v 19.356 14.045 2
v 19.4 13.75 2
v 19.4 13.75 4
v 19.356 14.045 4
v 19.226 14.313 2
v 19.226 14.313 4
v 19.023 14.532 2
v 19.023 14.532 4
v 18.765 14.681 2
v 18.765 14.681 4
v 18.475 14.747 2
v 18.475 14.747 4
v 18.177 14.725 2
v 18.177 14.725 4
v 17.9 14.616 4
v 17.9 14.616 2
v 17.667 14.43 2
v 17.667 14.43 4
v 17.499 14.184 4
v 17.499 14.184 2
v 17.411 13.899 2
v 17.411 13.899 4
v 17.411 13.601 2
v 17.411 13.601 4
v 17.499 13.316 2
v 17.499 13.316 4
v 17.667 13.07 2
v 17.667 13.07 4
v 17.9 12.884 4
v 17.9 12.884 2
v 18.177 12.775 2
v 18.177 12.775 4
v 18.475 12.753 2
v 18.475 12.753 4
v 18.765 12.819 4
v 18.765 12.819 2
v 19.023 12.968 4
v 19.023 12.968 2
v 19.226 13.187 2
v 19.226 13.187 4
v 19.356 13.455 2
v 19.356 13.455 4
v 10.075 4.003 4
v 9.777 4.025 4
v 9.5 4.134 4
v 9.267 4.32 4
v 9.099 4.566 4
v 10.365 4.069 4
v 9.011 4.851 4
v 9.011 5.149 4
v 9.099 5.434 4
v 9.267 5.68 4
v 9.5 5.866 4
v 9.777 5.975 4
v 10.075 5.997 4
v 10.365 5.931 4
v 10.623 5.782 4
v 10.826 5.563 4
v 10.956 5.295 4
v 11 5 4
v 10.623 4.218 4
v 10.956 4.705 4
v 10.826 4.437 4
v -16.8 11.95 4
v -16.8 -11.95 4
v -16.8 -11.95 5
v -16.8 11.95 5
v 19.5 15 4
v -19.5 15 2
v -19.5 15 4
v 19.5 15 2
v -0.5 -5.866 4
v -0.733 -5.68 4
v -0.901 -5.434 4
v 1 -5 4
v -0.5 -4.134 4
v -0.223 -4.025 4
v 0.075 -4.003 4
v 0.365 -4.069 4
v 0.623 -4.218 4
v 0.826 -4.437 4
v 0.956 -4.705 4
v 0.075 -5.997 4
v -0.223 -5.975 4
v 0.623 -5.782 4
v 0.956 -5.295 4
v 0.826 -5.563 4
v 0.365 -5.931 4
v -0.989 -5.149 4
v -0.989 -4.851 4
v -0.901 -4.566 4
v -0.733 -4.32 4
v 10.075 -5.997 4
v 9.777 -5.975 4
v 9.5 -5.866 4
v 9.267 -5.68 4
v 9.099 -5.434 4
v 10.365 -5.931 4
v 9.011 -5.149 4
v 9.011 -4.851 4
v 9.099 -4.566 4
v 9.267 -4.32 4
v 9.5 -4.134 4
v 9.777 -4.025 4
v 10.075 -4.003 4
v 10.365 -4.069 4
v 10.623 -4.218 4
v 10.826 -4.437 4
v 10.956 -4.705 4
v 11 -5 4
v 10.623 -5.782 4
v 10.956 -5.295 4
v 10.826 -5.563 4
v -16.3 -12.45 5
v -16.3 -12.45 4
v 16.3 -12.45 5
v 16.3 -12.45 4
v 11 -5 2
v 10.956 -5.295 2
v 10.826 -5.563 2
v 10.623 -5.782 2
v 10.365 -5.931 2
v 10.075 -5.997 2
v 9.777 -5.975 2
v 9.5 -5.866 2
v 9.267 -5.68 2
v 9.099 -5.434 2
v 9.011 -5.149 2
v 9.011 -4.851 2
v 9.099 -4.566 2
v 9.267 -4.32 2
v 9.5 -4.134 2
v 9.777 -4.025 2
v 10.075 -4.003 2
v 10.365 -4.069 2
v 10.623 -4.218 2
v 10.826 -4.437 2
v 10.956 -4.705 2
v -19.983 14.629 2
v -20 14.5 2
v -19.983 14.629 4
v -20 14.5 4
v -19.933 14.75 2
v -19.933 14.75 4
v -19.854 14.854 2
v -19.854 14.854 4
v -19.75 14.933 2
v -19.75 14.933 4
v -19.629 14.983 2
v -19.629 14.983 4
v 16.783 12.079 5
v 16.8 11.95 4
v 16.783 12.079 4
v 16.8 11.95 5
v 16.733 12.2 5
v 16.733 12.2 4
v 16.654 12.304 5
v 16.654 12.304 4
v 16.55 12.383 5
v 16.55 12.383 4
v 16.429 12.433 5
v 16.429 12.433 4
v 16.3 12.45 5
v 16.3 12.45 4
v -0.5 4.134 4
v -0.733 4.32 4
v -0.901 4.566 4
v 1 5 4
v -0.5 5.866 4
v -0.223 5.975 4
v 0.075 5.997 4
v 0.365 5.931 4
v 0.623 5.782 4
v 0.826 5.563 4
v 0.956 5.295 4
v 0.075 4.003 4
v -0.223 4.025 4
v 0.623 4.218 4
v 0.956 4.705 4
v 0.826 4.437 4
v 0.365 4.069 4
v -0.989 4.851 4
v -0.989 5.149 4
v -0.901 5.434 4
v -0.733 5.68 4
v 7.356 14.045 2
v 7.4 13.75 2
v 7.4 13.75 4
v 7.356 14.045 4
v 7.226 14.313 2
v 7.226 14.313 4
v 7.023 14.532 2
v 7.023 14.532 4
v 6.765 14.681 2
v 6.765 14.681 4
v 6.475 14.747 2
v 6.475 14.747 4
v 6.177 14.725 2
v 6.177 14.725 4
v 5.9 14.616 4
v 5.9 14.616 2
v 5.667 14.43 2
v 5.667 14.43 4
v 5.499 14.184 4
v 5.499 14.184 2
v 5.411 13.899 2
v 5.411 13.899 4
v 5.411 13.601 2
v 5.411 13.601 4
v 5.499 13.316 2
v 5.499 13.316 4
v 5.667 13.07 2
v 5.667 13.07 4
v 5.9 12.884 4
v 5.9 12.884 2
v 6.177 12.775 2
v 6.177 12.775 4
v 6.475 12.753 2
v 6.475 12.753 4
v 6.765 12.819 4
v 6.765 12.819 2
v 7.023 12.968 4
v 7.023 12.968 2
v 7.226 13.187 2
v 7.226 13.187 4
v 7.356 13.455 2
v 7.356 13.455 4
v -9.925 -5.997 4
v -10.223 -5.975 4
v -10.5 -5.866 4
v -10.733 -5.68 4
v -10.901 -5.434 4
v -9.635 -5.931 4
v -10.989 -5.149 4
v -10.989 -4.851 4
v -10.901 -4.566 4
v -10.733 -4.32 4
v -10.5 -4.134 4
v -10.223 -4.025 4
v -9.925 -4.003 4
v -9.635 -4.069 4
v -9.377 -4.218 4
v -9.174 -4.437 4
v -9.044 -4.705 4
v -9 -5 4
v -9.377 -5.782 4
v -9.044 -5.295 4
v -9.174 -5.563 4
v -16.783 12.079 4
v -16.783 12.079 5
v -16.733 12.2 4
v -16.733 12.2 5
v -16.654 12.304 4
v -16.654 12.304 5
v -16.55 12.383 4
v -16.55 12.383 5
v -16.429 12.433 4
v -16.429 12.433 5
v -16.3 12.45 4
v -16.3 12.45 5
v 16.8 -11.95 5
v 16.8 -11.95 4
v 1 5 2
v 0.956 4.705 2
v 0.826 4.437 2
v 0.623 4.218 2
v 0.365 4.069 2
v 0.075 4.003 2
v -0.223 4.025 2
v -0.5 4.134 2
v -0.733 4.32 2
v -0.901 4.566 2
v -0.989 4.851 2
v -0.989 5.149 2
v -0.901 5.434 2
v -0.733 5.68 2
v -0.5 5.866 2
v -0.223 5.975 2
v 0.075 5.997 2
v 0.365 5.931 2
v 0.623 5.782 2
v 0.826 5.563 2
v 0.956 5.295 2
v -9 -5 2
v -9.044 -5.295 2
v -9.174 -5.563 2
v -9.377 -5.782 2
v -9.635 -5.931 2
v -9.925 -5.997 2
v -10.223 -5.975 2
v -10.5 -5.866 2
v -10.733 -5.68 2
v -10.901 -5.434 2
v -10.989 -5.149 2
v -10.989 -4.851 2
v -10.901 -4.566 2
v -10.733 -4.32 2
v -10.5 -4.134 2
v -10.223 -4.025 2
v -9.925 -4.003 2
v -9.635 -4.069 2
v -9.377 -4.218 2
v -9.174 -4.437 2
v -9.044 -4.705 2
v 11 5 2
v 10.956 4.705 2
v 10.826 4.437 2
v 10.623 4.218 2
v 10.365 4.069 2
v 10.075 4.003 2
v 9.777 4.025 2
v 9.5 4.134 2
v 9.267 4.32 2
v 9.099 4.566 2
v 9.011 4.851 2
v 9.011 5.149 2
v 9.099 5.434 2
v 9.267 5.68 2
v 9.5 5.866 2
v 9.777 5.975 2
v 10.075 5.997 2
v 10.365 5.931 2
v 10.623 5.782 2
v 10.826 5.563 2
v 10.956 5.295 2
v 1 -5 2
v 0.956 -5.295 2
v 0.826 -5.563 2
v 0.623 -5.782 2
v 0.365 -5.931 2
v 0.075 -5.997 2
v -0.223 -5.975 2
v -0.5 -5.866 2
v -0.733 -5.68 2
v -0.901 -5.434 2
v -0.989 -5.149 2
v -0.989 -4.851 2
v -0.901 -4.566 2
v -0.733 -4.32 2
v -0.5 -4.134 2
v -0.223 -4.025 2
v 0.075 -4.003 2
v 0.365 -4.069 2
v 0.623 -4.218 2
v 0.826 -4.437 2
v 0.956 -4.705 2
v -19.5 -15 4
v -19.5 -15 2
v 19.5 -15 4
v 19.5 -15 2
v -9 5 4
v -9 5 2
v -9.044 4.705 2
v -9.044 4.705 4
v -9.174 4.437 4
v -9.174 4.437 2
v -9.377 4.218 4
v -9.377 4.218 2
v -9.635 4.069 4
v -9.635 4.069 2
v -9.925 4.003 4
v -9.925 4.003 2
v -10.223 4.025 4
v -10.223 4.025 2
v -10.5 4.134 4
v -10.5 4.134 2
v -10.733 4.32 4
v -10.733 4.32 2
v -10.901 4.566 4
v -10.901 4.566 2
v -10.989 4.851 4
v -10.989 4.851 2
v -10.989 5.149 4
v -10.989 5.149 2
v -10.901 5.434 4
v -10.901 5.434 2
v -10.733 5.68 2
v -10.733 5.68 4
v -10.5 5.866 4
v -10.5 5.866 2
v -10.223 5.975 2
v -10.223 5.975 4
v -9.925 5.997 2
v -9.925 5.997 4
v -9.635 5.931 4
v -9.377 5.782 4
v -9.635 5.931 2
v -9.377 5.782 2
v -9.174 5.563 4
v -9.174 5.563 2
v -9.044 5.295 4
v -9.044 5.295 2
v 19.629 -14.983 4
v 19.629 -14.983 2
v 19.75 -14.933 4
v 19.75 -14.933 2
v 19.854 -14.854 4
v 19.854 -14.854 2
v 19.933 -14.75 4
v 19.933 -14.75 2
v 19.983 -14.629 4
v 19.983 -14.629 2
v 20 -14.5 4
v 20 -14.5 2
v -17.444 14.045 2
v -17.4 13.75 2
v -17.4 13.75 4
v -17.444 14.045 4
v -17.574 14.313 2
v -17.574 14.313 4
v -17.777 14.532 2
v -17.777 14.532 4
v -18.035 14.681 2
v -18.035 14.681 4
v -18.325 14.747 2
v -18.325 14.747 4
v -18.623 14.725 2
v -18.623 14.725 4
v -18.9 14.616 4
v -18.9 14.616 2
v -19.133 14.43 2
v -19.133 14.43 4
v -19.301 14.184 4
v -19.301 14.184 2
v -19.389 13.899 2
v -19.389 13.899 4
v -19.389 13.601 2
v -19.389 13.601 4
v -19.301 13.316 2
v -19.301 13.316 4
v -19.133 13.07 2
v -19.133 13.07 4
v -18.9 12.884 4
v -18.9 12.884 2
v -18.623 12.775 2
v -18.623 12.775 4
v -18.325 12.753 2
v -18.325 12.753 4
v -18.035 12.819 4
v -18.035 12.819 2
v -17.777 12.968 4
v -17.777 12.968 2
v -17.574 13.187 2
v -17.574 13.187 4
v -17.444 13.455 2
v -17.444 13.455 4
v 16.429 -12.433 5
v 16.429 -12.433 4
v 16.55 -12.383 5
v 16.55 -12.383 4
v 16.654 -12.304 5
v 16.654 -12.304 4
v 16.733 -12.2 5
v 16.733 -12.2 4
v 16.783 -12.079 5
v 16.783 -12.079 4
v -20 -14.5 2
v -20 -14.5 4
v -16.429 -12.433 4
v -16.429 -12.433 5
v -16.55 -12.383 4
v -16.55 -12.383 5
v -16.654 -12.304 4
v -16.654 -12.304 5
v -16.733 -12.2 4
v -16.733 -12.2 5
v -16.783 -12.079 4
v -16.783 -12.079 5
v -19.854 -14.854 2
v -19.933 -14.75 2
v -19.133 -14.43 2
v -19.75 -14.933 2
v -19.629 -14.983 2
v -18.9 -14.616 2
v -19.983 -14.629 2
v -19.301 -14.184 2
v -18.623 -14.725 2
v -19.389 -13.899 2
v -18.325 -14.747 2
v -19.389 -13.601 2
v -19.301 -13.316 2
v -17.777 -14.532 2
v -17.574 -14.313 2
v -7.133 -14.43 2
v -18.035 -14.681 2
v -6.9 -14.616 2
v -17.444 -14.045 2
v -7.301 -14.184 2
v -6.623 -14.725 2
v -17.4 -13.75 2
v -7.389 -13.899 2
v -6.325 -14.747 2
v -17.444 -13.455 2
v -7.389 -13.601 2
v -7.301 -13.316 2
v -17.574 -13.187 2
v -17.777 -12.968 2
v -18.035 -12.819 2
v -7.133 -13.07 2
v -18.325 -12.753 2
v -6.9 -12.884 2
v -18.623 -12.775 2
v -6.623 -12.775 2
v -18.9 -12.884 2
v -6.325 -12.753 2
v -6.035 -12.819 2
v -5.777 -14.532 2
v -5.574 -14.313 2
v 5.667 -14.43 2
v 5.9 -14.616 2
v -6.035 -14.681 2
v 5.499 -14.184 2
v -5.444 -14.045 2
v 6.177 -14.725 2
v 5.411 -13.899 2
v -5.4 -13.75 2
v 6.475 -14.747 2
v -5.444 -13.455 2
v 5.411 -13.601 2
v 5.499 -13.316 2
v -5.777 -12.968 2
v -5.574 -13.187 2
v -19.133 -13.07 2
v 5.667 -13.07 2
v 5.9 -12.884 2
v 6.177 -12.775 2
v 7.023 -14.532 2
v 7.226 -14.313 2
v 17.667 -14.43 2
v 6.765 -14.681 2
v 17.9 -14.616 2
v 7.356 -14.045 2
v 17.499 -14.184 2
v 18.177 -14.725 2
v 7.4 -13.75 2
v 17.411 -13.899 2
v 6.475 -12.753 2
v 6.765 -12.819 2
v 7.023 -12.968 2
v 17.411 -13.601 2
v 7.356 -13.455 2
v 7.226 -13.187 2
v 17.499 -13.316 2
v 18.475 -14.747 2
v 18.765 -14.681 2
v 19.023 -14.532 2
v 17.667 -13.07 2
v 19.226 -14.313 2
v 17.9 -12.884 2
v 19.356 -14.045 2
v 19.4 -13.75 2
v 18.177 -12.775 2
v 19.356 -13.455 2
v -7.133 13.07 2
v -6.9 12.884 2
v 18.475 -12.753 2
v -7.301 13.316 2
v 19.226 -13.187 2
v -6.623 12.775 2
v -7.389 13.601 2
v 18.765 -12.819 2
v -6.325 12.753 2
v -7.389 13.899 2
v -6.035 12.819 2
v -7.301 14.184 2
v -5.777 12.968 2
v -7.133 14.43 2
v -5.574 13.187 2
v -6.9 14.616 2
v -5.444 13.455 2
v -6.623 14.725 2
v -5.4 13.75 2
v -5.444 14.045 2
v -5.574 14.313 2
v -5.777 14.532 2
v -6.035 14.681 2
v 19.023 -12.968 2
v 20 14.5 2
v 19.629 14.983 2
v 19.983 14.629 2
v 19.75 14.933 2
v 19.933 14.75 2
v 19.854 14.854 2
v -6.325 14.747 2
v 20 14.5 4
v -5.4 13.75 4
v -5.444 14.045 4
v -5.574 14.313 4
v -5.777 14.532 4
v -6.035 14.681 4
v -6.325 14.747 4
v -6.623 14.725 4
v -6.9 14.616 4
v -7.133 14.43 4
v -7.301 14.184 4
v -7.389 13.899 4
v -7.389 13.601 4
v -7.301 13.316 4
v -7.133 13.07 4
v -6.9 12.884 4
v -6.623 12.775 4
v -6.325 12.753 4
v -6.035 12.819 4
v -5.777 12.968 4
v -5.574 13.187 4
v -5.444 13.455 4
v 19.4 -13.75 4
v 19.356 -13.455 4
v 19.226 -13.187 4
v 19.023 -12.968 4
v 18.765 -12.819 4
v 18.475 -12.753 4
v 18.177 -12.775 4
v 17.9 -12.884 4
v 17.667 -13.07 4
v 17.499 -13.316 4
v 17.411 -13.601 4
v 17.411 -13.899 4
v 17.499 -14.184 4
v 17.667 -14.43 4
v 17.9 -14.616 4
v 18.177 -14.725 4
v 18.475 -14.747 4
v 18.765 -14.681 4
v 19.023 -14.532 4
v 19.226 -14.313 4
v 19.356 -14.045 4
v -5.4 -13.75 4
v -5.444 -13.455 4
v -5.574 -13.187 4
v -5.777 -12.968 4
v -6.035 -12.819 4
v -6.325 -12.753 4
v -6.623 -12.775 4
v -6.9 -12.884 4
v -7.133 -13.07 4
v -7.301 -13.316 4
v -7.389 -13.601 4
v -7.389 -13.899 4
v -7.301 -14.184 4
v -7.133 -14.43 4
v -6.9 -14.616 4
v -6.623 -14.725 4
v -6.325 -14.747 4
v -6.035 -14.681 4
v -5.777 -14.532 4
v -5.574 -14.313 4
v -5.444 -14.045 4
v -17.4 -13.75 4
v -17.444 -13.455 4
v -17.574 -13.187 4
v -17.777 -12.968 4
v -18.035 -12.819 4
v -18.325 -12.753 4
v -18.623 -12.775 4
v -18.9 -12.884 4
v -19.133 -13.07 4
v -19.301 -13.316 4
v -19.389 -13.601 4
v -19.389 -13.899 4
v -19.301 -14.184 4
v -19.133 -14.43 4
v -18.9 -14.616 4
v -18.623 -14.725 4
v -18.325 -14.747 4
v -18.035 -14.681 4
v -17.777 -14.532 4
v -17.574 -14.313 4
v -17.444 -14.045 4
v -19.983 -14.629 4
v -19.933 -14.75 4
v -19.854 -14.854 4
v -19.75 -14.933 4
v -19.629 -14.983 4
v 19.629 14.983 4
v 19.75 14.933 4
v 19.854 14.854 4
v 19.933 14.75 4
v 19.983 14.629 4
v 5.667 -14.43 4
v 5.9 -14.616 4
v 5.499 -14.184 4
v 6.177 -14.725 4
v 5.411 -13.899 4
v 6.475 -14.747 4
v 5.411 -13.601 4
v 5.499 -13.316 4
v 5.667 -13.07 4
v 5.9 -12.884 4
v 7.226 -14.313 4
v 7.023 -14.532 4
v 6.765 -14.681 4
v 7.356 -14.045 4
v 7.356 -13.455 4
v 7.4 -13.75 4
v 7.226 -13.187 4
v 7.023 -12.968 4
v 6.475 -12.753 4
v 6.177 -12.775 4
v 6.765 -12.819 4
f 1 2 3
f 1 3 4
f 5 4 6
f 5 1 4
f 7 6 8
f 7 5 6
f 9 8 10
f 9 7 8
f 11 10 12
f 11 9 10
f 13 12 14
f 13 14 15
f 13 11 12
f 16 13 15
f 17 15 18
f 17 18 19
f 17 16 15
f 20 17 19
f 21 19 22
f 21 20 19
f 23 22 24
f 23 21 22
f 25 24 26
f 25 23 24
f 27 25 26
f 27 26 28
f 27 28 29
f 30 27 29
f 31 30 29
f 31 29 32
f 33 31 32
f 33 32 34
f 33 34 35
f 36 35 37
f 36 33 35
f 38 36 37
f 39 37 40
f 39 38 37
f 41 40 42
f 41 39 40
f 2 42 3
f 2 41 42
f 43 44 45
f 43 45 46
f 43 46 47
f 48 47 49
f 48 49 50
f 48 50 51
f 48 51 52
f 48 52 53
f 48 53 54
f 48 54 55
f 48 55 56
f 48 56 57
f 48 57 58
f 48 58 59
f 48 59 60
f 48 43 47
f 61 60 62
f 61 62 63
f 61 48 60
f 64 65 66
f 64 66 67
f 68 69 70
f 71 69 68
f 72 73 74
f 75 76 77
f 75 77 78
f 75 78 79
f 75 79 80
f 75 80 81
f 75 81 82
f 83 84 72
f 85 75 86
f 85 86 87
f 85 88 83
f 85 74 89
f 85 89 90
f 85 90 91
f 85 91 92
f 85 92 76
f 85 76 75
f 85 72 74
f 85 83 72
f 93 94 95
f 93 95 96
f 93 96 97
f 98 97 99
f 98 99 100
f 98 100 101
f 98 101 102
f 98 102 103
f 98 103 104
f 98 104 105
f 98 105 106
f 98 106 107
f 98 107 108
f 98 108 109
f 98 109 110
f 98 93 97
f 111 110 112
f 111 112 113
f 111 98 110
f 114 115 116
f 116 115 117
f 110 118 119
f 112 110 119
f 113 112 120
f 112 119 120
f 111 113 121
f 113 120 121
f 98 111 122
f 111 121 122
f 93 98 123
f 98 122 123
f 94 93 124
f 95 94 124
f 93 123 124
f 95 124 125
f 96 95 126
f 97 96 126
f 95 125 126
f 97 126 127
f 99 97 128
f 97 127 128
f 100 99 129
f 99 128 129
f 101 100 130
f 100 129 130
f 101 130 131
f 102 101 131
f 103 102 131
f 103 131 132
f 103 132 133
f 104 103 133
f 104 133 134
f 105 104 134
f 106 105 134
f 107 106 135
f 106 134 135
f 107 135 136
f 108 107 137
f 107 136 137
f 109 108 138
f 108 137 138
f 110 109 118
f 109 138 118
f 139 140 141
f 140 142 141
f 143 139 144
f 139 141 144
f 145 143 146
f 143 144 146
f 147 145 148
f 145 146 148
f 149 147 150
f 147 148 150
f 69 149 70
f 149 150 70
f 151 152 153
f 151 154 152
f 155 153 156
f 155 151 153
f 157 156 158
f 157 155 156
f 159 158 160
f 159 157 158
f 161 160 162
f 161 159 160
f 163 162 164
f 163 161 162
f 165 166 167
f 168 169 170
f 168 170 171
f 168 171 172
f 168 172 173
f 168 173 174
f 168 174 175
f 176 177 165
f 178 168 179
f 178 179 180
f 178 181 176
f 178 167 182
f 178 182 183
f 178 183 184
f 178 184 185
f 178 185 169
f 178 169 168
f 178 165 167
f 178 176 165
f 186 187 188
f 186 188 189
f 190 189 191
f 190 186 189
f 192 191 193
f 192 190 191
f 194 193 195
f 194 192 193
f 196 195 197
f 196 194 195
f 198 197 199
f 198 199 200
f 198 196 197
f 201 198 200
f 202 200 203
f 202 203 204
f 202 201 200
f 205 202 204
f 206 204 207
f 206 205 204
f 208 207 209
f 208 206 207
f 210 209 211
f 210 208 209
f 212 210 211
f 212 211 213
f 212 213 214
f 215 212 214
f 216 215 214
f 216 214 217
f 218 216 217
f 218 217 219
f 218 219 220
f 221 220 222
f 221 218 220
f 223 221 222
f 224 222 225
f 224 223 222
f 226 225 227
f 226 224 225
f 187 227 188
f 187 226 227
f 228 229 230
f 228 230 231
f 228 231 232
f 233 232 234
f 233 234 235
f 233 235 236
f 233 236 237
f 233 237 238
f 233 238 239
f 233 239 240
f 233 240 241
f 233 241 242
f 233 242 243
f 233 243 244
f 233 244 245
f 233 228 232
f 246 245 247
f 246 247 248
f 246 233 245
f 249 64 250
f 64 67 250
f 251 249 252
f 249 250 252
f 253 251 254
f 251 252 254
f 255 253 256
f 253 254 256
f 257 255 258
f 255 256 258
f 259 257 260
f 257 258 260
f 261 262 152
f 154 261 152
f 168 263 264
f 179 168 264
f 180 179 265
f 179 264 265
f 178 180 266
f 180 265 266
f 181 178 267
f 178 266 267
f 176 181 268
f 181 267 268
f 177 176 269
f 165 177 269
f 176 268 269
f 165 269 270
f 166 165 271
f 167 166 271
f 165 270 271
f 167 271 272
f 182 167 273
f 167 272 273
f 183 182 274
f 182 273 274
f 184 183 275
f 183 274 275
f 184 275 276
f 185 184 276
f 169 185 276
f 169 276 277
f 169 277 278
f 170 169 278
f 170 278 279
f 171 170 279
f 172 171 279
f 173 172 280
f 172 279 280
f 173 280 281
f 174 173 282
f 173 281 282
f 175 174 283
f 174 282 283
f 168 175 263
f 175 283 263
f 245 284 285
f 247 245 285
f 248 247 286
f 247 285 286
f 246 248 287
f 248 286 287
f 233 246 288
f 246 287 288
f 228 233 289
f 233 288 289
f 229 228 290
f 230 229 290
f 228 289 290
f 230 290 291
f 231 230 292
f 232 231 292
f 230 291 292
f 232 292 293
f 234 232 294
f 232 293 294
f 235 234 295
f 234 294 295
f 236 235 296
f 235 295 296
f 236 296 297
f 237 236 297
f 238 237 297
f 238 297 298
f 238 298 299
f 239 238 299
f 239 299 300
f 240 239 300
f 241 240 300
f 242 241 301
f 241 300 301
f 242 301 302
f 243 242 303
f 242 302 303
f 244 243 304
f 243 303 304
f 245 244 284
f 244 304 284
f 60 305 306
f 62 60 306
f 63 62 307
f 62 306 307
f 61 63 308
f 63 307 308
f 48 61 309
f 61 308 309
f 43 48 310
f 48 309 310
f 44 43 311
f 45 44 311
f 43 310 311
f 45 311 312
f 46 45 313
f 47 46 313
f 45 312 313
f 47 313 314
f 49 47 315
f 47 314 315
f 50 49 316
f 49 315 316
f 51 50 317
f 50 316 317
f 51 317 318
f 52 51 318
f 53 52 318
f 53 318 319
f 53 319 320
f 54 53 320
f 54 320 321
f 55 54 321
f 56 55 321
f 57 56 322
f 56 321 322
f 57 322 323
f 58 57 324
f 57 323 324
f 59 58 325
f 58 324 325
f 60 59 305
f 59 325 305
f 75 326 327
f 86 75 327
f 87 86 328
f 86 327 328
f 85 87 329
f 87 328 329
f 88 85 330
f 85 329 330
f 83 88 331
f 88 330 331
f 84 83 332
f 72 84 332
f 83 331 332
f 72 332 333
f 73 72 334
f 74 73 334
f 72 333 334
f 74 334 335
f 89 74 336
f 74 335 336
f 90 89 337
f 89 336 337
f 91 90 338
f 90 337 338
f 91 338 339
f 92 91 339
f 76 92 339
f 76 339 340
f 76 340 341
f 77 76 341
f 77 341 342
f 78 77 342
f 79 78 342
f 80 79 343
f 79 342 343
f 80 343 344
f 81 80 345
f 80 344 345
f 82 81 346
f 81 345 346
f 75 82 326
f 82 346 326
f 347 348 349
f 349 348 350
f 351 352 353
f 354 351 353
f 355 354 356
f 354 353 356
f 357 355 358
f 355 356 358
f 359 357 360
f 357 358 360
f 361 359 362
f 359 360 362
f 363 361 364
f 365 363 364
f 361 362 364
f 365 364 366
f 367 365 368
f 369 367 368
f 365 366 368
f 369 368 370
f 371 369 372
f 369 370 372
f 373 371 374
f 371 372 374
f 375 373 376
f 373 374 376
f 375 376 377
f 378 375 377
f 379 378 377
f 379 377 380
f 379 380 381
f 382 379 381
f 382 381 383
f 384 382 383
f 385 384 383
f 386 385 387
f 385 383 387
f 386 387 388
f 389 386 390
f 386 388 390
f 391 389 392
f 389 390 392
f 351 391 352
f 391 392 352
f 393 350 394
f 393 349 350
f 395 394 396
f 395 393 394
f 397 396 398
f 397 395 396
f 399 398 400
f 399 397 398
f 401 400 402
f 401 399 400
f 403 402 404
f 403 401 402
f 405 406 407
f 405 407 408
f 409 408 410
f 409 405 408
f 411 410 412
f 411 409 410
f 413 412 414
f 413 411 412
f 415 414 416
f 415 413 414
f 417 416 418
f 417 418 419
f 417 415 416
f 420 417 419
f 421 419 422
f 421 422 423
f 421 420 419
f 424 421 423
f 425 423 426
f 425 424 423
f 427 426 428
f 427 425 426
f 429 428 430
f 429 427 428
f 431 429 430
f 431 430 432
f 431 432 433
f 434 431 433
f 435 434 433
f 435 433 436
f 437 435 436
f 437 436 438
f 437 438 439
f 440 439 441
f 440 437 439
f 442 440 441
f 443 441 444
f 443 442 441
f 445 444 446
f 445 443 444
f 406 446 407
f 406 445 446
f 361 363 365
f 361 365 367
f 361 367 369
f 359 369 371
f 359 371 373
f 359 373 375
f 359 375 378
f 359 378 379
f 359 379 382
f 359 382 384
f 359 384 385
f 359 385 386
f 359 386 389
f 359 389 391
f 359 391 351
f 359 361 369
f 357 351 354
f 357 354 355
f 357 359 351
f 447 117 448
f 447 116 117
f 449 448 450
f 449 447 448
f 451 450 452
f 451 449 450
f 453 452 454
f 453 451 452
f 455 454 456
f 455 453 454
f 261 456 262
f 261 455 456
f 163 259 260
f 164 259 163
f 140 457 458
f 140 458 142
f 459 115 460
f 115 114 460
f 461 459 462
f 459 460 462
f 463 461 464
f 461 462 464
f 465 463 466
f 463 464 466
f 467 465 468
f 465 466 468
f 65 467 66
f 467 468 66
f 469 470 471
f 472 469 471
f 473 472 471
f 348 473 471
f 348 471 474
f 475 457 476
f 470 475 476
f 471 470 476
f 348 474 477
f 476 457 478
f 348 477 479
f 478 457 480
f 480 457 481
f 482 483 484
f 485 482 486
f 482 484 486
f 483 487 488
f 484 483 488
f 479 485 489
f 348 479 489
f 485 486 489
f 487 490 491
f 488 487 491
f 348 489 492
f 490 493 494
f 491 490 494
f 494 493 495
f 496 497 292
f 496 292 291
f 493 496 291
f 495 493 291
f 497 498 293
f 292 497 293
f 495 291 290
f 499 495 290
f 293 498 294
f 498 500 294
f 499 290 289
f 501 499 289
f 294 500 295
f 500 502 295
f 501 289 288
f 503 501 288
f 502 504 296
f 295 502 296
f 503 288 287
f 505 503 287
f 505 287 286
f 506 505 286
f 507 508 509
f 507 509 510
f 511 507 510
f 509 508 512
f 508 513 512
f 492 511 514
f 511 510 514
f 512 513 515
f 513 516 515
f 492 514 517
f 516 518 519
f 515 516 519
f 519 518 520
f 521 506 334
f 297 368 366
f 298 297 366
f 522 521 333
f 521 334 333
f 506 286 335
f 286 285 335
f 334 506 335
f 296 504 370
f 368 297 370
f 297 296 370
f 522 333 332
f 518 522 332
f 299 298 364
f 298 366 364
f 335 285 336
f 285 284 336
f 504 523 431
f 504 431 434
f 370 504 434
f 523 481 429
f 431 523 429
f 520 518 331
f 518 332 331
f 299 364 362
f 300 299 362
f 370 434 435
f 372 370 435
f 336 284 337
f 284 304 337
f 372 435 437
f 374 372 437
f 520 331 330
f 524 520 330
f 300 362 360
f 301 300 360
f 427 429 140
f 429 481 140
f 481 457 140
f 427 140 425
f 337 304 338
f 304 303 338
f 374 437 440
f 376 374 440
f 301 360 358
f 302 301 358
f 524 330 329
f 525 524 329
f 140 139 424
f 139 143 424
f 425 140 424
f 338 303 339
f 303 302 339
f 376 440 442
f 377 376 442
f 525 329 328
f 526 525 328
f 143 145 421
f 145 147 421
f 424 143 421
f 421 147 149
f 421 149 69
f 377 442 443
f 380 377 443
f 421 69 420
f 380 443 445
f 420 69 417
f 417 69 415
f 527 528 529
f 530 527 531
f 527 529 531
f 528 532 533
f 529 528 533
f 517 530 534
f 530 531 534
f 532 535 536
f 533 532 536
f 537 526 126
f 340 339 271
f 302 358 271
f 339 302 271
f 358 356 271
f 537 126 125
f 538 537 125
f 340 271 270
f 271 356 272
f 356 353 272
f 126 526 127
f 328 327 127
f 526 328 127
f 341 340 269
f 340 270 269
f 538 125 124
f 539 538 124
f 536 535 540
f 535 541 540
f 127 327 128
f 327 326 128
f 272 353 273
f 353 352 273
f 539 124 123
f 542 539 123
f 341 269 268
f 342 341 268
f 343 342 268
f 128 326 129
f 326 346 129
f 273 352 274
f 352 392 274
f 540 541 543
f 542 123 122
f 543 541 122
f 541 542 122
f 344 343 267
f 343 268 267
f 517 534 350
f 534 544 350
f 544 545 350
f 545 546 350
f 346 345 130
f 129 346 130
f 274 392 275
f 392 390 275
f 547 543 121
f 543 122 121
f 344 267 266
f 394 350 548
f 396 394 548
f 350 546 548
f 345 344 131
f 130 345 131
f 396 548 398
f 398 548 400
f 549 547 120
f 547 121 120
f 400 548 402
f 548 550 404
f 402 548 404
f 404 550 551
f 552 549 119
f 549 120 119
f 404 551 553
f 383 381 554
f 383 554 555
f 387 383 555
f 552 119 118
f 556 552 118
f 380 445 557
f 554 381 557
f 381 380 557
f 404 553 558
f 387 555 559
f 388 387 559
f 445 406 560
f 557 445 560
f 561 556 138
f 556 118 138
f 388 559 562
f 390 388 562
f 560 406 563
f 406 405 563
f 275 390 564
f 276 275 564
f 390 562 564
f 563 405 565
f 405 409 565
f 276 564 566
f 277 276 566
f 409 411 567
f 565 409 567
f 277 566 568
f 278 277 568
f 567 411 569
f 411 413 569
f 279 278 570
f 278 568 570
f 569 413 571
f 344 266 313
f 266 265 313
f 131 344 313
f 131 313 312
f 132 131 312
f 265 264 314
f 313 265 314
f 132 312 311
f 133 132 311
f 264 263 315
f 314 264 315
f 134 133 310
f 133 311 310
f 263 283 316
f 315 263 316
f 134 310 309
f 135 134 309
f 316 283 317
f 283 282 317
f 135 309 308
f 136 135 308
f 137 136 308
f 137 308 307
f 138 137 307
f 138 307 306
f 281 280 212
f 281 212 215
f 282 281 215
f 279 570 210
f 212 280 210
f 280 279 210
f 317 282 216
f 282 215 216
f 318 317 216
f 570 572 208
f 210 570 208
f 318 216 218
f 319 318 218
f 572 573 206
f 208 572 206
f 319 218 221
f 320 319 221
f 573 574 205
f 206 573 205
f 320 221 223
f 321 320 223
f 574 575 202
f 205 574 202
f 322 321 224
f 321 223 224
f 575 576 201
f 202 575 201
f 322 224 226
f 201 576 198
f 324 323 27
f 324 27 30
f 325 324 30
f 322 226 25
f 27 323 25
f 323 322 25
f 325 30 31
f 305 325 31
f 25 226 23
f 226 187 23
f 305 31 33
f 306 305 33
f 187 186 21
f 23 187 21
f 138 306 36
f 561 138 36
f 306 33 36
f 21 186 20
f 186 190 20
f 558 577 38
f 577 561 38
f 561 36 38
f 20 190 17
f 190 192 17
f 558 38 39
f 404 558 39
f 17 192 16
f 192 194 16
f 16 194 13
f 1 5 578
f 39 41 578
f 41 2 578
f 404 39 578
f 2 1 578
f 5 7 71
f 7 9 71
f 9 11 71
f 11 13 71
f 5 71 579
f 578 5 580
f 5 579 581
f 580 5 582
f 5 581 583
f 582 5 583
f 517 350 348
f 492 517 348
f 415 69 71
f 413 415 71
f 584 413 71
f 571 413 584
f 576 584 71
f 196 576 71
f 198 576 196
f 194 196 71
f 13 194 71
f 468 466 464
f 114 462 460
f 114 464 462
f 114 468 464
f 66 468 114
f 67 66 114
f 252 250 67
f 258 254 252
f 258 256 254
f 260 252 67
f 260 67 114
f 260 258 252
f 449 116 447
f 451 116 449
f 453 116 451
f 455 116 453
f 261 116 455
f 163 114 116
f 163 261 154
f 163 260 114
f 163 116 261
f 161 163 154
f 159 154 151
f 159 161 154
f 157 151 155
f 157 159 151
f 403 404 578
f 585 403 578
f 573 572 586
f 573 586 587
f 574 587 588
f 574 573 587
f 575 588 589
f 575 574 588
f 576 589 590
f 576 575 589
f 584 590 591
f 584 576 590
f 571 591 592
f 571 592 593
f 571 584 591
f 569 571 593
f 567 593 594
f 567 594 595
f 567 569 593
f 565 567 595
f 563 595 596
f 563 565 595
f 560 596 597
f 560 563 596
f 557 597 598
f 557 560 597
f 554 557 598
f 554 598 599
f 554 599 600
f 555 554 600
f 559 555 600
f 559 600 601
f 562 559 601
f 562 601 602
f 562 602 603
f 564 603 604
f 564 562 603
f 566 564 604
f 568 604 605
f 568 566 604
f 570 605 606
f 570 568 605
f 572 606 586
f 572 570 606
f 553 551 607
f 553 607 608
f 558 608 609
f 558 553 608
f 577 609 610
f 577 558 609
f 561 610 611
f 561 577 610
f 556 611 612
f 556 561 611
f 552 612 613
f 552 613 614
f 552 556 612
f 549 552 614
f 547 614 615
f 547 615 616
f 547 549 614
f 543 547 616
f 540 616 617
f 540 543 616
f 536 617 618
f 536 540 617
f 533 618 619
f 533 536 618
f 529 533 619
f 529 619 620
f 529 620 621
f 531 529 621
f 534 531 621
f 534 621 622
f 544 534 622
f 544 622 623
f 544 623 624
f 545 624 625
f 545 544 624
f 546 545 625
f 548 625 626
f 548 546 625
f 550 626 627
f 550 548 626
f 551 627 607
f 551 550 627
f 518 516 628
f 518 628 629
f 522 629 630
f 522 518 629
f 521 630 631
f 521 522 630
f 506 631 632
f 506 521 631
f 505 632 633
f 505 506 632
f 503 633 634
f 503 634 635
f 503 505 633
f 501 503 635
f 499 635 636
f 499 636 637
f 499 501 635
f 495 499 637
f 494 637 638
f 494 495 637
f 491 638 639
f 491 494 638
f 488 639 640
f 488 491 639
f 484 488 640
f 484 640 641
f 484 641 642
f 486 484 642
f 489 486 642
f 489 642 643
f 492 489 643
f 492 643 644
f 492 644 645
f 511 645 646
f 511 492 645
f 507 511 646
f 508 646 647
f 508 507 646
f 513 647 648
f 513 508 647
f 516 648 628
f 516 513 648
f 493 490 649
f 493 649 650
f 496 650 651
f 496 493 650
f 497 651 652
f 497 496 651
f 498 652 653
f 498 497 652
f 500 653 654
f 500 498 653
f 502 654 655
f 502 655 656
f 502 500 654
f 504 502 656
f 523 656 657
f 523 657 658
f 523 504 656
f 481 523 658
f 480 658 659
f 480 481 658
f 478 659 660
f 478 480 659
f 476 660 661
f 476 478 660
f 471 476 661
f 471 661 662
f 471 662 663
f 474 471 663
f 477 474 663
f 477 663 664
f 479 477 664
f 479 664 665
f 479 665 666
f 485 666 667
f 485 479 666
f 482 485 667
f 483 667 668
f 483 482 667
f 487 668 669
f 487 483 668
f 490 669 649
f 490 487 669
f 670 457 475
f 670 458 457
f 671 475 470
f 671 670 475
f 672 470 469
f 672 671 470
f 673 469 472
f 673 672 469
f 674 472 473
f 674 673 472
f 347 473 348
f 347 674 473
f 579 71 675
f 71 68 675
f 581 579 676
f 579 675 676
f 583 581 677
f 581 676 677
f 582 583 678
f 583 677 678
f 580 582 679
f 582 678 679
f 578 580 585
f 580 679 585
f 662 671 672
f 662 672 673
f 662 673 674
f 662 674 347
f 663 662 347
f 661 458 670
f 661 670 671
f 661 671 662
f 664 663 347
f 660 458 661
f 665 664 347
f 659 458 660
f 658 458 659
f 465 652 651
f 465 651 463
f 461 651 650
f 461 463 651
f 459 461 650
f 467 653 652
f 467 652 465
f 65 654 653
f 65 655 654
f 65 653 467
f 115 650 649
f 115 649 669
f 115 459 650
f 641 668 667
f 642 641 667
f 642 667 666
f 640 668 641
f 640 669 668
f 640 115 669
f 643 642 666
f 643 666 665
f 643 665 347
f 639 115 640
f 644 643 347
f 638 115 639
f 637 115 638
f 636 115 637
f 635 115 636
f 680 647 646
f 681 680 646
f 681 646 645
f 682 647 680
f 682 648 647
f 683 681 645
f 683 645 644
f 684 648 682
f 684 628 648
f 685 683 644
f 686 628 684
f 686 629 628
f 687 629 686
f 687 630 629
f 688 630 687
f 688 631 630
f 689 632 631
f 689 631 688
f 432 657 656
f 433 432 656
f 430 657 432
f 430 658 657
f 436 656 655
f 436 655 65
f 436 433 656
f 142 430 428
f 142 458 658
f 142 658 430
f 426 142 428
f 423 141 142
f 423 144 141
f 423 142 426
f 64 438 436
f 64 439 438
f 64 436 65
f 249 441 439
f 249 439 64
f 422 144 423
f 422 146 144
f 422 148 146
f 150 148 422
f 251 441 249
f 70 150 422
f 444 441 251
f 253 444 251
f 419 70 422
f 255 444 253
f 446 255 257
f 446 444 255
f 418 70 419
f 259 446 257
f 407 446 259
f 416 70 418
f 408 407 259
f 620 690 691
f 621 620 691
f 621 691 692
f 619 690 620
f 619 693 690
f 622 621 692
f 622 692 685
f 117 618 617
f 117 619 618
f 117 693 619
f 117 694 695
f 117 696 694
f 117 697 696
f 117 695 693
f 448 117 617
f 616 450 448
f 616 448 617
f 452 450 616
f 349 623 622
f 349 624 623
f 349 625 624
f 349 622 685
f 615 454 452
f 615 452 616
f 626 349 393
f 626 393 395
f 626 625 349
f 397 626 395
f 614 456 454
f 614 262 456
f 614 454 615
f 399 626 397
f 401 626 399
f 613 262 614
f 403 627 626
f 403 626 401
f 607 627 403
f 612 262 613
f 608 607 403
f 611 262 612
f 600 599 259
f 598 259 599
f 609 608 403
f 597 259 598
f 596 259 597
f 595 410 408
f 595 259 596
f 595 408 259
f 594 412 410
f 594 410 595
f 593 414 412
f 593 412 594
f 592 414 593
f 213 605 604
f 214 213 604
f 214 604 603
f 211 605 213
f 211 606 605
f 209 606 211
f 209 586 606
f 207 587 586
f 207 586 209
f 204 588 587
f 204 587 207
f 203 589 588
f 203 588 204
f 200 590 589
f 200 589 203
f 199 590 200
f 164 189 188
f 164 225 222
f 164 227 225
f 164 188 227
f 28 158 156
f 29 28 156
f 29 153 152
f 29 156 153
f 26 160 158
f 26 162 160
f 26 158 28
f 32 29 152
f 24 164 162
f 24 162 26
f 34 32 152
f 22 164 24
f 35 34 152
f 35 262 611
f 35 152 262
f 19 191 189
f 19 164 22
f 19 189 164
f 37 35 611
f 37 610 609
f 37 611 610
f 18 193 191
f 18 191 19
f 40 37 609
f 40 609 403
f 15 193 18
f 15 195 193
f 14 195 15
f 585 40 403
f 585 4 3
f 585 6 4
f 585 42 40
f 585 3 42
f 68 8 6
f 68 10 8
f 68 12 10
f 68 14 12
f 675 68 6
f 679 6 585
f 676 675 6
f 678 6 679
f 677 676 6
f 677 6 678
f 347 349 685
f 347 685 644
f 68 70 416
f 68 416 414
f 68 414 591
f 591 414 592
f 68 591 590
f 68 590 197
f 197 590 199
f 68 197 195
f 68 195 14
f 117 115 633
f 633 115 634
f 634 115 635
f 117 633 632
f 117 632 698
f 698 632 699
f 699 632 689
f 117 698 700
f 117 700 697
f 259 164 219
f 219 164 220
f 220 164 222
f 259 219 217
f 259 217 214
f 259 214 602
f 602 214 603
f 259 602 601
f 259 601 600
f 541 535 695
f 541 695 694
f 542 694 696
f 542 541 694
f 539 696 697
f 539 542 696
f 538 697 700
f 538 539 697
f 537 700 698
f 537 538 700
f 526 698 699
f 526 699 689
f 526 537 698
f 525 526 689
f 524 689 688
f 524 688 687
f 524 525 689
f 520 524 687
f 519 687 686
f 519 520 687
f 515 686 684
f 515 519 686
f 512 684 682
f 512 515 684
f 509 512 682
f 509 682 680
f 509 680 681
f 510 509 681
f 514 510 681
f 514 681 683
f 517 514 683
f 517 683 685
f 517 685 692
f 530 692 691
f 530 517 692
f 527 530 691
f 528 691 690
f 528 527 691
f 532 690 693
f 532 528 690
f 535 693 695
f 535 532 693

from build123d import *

# Parameters (mm, degrees)
SKETCH_W        = 40
SKETCH_H        = 30
PAD_DEPTH       = 2
SKETCH001_W     = 33.6
SKETCH001_H     = 24.9
PAD001_DEPTH    = 1
SKETCH002_R     = 1
POCKET_DEPTH    = 2
FILLET_R        = 0.5
SKETCH003_R     = 1
POCKET001_DEPTH = 2


with BuildPart() as part:
    # Sketch → Pad (new body)
    with BuildSketch(Plane.XY.offset(2)):
        Rectangle(SKETCH_W, SKETCH_H)
    extrude(amount=PAD_DEPTH)

    # Sketch001 (on Face6 of Pad) → Pad001 (join)
    with BuildSketch(Plane.XY.offset(4)):
        Rectangle(SKETCH001_W, SKETCH001_H)
    extrude(amount=PAD001_DEPTH)

    # Sketch002 → Pocket (cut)
    with BuildSketch(Plane.XY.offset(2)):
        with Locations((-18.4, 13.75)):
            Circle(SKETCH002_R)
        with Locations((-6.4, 13.75)):
            Circle(SKETCH002_R)
        with Locations((6.4, 13.75)):
            Circle(SKETCH002_R)
        with Locations((18.4, 13.75)):
            Circle(SKETCH002_R)
        with Locations((18.4, -13.75)):
            Circle(SKETCH002_R)
        with Locations((6.4, -13.75)):
            Circle(SKETCH002_R)
        with Locations((-6.4, -13.75)):
            Circle(SKETCH002_R)
        with Locations((-18.4, -13.75)):
            Circle(SKETCH002_R)
    extrude(amount=POCKET_DEPTH, mode=Mode.SUBTRACT)

    # Fillet
    fillet_edges = [part.edges().sort_by_distance(p)[0] for p in [
        (20, 15, 3),
        (16.8, 12.45, 4.5),
        (20, -15, 3),
        (16.8, -12.45, 4.5),
        (-20, -15, 3),
        (-16.8, -12.45, 4.5),
        (-20, 15, 3),
        (-16.8, 12.45, 4.5),
    ]]
    fillet(fillet_edges, radius=FILLET_R)

    # Sketch003 (on Face2 of Fillet) → Pocket001 (cut)
    with BuildSketch(Plane(origin=(0, 0, 2), x_dir=(1, 0, 0), z_dir=(0, 0, -1))):
        with Locations((-10, 5)):
            Circle(SKETCH003_R)
        with Locations((0, 5)):
            Circle(SKETCH003_R)
        with Locations((10, 5)):
            Circle(SKETCH003_R)
        with Locations((-10, -5)):
            Circle(SKETCH003_R)
        with Locations((0, -5)):
            Circle(SKETCH003_R)
        with Locations((10, -5)):
            Circle(SKETCH003_R)
    extrude(amount=-POCKET001_DEPTH, mode=Mode.SUBTRACT)


solid = part.part
